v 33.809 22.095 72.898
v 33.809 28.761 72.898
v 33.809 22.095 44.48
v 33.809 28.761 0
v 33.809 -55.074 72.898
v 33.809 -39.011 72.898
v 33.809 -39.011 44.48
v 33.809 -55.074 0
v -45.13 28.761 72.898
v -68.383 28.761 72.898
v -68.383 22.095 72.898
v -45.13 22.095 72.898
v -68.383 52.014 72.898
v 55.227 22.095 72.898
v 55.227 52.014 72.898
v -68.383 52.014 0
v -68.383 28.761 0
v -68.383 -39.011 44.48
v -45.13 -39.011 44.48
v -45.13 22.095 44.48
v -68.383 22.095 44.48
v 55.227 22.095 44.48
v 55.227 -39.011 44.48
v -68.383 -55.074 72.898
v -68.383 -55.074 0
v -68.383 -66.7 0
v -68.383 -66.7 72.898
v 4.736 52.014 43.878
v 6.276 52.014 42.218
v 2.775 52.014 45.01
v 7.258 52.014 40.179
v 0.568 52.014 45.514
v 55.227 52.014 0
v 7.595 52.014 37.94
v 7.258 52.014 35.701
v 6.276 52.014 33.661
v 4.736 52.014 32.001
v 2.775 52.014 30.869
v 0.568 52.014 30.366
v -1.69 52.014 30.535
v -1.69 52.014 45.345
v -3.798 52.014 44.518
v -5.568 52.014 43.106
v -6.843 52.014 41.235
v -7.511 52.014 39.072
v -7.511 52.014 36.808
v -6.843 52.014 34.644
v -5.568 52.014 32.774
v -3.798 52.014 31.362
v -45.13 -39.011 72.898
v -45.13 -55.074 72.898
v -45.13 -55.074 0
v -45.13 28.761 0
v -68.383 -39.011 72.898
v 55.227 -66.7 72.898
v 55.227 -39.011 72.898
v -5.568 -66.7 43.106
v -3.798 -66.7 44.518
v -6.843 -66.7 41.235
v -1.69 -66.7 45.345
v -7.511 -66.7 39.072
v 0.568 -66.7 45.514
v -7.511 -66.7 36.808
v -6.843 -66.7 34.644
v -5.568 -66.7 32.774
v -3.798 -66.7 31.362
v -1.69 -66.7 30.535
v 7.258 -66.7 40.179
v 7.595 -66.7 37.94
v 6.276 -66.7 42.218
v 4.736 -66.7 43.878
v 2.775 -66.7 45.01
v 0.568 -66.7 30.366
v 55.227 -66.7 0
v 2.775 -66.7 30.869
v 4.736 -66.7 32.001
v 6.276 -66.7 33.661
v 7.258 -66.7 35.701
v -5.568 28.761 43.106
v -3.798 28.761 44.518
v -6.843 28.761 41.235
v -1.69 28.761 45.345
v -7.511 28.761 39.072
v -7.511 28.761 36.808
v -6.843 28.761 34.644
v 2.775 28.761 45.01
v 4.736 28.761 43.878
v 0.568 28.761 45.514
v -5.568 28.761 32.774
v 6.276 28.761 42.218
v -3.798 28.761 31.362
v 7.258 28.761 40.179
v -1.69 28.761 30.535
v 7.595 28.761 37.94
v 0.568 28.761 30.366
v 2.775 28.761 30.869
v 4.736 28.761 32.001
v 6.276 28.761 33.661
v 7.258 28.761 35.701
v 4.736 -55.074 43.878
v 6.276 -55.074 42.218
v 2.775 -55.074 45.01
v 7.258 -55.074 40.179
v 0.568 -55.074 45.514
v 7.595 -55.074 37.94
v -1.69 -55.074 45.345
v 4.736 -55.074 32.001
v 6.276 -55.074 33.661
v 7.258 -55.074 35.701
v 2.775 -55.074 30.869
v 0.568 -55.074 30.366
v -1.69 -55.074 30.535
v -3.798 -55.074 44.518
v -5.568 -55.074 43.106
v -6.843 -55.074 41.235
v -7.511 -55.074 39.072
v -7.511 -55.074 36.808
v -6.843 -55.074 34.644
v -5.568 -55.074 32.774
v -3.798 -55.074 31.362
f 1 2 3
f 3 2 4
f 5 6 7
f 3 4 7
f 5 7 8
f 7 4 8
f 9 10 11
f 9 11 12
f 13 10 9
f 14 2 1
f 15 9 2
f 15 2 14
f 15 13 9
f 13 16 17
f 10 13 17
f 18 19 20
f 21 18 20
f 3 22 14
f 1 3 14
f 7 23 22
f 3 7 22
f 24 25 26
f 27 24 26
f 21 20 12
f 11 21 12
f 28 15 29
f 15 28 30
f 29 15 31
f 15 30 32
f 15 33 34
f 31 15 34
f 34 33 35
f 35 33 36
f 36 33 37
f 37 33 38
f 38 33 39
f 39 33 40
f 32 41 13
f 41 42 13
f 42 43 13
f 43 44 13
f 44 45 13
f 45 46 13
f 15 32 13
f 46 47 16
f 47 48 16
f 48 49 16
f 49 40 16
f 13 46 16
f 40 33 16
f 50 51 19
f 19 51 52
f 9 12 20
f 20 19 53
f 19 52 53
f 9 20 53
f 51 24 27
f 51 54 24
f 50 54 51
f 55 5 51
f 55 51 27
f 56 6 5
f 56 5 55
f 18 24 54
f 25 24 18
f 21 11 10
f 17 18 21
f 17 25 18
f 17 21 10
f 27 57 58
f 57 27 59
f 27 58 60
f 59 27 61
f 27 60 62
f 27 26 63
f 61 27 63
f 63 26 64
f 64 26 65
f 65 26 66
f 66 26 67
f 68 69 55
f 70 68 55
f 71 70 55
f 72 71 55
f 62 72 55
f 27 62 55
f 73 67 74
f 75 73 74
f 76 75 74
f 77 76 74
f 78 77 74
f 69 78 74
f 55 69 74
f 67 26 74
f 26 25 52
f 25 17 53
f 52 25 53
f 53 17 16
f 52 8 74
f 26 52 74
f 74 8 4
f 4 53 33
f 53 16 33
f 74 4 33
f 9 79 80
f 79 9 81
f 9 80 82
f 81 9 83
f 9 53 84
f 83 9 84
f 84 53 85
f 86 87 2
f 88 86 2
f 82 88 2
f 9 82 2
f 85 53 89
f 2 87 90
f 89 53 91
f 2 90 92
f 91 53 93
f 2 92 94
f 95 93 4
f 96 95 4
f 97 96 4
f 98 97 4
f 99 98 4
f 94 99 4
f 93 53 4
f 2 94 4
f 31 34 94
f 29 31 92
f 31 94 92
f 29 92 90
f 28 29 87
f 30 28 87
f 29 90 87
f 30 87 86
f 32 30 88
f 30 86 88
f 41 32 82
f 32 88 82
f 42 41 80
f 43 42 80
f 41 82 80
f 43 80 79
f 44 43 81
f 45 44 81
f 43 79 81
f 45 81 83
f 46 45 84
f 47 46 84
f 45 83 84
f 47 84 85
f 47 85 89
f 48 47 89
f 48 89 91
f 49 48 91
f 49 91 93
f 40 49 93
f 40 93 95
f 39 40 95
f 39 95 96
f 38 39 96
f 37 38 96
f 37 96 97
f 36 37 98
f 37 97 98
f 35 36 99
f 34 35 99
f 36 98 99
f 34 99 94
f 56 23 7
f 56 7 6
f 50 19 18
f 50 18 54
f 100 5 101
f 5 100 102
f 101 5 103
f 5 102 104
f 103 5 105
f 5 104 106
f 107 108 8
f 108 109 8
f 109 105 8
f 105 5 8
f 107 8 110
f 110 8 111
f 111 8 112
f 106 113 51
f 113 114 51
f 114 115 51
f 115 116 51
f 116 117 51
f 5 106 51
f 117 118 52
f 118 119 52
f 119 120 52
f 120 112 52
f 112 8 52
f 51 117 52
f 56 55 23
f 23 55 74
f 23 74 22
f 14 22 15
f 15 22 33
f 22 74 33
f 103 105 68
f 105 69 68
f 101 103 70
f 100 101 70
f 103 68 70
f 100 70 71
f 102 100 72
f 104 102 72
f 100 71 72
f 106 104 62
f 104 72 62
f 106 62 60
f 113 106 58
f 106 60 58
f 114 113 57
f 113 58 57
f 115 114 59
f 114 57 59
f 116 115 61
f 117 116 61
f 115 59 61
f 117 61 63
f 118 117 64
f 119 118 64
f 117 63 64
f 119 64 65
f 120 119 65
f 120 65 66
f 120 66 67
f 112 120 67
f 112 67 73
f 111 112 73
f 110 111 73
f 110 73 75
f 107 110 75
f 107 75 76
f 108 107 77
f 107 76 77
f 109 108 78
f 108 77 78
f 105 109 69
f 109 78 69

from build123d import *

# Parameters (mm, degrees)
F0_W     = 23.253381
F0_H     = 83.83457
F1_DEPTH = 72.898
F2_R     = 7.595409
F3_DEPTH = 112.014
F4_W     = 61.105391
F4_H     = 29.362335
F5_DEPTH = 109.982


with BuildPart() as f1:
    # F0 (on Top) → F1 (new body)
    with BuildSketch(Plane.XY):
        Polygon((-68.383306, -55.073805), (-68.383306, -66.700496), (55.226788, -66.700496), (55.226788, -55.073805), (33.809196, -55.073805), (-45.129925, -55.073805), align=None)
        with Locations((-56.756615, -13.15652)):
            Rectangle(F0_W, F0_H)
        Polygon((-68.383306, 52.01415), (-68.383306, 28.760765), (-45.129925, 28.760765), (33.809196, 28.760765), (33.809196, 52.01415), align=None)
        Polygon((33.809196, -55.073805), (55.226788, -55.073805), (55.226788, 52.01415), (33.809196, 52.01415), (33.809196, 28.760765), align=None)
    extrude(amount=F1_DEPTH)

    # F2 (on Front) → F3 (cut, symmetric)
    with BuildSketch(Plane.XZ):
        with Locations((0, 37.939731)):
            Circle(F2_R)
    extrude(amount=F3_DEPTH, both=True, mode=Mode.SUBTRACT)

    # F4 (on Right) → F5 (cut, symmetric)
    with BuildSketch(Plane.YZ):
        with Locations((-8.457915, 59.161521)):
            Rectangle(F4_W, F4_H)
    extrude(amount=F5_DEPTH, both=True, mode=Mode.SUBTRACT)


solid = f1.part
